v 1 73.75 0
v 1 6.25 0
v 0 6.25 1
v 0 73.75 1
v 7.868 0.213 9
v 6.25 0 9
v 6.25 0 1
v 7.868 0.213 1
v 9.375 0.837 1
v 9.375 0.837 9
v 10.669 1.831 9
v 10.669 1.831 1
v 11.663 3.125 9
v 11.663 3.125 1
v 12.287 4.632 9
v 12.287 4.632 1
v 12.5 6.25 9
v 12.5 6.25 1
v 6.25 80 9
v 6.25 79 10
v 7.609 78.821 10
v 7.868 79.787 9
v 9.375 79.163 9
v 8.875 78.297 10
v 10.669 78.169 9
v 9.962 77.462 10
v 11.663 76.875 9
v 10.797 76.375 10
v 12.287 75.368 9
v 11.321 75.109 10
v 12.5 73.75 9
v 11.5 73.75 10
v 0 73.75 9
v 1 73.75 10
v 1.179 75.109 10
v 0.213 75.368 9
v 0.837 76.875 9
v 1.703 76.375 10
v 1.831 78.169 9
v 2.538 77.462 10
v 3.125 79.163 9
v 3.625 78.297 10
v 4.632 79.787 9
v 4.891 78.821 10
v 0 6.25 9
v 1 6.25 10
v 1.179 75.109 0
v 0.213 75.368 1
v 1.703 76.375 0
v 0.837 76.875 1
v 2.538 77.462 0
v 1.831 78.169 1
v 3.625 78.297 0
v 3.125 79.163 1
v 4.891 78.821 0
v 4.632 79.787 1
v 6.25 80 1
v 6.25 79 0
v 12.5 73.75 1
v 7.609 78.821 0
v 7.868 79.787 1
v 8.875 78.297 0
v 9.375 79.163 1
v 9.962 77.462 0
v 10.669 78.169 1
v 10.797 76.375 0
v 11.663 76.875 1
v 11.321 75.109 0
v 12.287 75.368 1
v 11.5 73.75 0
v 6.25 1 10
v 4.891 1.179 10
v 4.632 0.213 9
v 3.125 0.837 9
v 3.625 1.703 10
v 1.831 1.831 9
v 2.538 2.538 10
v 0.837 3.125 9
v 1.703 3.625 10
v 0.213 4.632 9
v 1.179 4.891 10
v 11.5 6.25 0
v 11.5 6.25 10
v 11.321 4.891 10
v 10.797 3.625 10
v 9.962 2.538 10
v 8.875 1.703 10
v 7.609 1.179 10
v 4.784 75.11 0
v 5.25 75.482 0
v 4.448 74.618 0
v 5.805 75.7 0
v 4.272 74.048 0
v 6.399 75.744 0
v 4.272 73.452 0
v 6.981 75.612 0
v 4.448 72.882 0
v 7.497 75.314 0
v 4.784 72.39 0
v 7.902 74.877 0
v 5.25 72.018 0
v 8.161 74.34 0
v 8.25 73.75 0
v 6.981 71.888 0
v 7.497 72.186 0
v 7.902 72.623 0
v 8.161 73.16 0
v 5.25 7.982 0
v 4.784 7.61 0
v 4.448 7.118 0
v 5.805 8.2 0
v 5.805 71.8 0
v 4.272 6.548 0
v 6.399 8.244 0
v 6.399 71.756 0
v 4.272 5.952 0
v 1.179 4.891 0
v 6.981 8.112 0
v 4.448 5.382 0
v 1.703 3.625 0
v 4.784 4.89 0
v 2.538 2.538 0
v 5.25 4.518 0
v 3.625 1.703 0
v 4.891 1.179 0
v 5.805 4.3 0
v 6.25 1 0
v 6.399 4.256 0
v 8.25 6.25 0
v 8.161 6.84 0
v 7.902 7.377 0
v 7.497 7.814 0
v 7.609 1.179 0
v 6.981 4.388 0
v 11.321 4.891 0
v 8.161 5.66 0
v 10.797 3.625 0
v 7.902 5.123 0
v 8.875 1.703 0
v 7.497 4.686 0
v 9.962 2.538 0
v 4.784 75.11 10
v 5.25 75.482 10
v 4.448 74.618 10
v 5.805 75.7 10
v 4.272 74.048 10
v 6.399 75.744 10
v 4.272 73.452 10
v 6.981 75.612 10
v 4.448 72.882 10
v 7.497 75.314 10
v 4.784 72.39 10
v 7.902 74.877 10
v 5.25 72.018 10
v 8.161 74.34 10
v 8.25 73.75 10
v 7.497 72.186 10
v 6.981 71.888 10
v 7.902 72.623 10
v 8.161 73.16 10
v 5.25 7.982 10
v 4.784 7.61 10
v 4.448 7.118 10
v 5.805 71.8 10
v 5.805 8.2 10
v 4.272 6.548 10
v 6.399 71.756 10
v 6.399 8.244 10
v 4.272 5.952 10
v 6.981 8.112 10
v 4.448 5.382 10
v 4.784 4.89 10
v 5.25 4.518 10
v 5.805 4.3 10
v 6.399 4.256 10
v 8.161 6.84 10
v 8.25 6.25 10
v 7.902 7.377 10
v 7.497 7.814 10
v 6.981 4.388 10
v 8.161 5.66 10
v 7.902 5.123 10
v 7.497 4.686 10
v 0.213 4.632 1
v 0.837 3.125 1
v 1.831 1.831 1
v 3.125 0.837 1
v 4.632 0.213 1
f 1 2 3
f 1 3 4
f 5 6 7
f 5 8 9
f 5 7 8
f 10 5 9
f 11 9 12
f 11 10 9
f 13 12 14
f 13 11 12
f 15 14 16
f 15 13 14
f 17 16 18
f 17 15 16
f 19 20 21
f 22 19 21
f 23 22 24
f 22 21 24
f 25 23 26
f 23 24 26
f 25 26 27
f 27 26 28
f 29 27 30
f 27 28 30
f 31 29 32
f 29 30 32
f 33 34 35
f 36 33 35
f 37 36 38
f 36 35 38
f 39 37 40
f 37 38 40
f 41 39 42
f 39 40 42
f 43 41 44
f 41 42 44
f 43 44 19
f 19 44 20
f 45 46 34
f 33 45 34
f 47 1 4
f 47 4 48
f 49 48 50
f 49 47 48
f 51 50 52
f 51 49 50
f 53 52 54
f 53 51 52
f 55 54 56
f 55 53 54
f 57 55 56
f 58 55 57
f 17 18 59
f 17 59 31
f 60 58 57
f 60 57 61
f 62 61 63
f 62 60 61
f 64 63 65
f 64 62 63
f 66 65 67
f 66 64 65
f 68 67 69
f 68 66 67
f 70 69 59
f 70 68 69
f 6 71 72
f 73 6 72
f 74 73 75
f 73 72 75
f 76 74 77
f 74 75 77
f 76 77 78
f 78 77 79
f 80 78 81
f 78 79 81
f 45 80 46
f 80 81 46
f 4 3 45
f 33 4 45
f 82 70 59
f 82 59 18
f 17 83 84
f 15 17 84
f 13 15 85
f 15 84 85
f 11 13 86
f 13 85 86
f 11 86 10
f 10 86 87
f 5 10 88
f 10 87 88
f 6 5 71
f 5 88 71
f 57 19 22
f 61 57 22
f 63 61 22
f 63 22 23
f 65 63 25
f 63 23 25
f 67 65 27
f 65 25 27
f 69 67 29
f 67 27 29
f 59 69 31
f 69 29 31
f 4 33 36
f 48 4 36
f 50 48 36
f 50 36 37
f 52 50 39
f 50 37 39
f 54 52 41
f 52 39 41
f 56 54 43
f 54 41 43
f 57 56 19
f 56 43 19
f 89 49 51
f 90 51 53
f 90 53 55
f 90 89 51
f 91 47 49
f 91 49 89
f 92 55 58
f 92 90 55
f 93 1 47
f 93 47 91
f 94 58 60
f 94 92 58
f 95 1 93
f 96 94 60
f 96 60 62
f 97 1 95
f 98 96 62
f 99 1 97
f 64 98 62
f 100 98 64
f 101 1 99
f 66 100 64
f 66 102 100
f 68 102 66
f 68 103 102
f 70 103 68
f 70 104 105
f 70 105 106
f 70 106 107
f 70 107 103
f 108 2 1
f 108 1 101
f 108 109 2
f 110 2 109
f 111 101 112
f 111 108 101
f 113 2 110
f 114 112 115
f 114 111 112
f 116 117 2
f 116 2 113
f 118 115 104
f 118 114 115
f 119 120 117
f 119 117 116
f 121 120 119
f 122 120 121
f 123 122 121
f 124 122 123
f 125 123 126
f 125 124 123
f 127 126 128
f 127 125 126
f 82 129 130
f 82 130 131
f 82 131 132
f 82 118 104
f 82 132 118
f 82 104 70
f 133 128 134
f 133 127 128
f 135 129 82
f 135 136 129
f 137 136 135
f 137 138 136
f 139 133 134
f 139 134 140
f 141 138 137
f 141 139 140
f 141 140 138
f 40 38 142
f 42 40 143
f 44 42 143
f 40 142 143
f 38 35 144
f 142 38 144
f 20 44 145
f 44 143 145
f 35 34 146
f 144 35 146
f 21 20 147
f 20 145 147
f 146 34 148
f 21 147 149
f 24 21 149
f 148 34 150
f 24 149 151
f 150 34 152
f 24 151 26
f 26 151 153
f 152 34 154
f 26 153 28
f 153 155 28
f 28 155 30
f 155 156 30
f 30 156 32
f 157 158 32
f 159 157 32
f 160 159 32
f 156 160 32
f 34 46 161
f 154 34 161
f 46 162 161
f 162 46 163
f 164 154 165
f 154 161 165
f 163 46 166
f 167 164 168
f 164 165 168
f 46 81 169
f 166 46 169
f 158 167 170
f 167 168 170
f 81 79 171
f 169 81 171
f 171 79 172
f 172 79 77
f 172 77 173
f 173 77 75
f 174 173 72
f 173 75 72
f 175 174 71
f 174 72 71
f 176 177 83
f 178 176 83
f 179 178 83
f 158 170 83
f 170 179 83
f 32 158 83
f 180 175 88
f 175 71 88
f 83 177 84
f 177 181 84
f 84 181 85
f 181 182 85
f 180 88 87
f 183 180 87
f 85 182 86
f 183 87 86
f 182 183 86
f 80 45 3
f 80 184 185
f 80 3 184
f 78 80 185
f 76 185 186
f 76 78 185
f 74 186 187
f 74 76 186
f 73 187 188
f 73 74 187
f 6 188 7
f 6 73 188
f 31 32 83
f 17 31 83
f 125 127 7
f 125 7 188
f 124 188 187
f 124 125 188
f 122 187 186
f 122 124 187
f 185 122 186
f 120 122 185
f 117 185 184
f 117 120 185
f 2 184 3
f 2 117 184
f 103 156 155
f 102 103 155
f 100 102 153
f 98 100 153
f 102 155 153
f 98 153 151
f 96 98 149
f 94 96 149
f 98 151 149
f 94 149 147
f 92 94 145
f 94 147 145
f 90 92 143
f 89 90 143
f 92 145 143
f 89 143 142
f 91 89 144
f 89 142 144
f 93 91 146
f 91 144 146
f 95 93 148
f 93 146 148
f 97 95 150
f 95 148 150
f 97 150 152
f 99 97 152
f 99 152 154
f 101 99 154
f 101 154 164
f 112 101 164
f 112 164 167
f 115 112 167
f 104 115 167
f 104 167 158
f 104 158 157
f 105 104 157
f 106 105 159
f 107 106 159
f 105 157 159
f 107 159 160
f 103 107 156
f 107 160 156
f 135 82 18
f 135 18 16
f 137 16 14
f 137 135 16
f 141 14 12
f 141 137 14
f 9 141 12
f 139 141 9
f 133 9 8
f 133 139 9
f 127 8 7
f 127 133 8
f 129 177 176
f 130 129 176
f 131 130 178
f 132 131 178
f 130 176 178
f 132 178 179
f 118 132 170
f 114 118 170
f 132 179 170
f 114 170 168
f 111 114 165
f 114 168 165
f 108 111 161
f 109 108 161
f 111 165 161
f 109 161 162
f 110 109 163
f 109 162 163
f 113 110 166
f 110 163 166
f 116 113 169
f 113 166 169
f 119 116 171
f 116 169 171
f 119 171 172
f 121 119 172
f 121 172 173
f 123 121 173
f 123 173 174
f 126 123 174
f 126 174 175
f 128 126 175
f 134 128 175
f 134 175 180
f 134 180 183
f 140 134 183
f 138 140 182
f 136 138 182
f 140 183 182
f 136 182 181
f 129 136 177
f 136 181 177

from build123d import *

# Parameters (mm, degrees)
F0_W     = 12.5
F0_H     = 10
F1_DEPTH = 80
F2_R     = 2
F3_DEPTH = 10
F4_R     = 6.24999
F5_SIZE  = 1


# Not quite as in the source:
# - a fillet or chamfer is up to 0.001 mm smaller than in the source, because OpenCascade refuses the exact size


with BuildPart() as f1:
    # F0 (on Front) → F1 (new body)
    with BuildSketch(Plane.XZ):
        with Locations((6.25, 5)):
            Rectangle(F0_W, F0_H)
    extrude(amount=-F1_DEPTH)

    # F2 (on face) → F3 (cut, through all)
    with BuildSketch(Plane.XY.offset(10)):
        with Locations((6.25, 73.75)):
            Circle(F2_R)
        with Locations((6.25, 6.25)):
            Circle(F2_R)
    extrude(amount=-F3_DEPTH, mode=Mode.SUBTRACT)

    # F4 (radius 6.25 in the source; OpenCascade refuses exactly that, so slightly less here)
    f4_edges = [f1.edges().sort_by_distance(p)[0] for p in [
        (12.5, 0, 5),
        (0, 0, 5),
        (12.5, 80, 5),
        (0, 80, 5),
    ]]
    fillet(f4_edges, radius=F4_R)

    # F5
    f5_edges = [f1.edges().sort_by_distance(p)[0] for p in [
        (0, 40, 10),
        (0, 6.24999, 5),
        (0, 73.75001, 5),
        (0, 40, 0),
        (10.66942, 1.83058, 0),
        (6.25001, 0, 5),
        (12.5, 6.24999, 5),
        (10.66942, 1.83058, 10),
        (12.5, 40, 0),
        (12.5, 73.75001, 5),
        (12.5, 40, 10),
        (10.66942, 78.16942, 0),
        (6.25001, 80, 5),
        (10.66942, 78.16942, 10),
    ]]
    chamfer(f5_edges, length=F5_SIZE)


solid = f1.part
